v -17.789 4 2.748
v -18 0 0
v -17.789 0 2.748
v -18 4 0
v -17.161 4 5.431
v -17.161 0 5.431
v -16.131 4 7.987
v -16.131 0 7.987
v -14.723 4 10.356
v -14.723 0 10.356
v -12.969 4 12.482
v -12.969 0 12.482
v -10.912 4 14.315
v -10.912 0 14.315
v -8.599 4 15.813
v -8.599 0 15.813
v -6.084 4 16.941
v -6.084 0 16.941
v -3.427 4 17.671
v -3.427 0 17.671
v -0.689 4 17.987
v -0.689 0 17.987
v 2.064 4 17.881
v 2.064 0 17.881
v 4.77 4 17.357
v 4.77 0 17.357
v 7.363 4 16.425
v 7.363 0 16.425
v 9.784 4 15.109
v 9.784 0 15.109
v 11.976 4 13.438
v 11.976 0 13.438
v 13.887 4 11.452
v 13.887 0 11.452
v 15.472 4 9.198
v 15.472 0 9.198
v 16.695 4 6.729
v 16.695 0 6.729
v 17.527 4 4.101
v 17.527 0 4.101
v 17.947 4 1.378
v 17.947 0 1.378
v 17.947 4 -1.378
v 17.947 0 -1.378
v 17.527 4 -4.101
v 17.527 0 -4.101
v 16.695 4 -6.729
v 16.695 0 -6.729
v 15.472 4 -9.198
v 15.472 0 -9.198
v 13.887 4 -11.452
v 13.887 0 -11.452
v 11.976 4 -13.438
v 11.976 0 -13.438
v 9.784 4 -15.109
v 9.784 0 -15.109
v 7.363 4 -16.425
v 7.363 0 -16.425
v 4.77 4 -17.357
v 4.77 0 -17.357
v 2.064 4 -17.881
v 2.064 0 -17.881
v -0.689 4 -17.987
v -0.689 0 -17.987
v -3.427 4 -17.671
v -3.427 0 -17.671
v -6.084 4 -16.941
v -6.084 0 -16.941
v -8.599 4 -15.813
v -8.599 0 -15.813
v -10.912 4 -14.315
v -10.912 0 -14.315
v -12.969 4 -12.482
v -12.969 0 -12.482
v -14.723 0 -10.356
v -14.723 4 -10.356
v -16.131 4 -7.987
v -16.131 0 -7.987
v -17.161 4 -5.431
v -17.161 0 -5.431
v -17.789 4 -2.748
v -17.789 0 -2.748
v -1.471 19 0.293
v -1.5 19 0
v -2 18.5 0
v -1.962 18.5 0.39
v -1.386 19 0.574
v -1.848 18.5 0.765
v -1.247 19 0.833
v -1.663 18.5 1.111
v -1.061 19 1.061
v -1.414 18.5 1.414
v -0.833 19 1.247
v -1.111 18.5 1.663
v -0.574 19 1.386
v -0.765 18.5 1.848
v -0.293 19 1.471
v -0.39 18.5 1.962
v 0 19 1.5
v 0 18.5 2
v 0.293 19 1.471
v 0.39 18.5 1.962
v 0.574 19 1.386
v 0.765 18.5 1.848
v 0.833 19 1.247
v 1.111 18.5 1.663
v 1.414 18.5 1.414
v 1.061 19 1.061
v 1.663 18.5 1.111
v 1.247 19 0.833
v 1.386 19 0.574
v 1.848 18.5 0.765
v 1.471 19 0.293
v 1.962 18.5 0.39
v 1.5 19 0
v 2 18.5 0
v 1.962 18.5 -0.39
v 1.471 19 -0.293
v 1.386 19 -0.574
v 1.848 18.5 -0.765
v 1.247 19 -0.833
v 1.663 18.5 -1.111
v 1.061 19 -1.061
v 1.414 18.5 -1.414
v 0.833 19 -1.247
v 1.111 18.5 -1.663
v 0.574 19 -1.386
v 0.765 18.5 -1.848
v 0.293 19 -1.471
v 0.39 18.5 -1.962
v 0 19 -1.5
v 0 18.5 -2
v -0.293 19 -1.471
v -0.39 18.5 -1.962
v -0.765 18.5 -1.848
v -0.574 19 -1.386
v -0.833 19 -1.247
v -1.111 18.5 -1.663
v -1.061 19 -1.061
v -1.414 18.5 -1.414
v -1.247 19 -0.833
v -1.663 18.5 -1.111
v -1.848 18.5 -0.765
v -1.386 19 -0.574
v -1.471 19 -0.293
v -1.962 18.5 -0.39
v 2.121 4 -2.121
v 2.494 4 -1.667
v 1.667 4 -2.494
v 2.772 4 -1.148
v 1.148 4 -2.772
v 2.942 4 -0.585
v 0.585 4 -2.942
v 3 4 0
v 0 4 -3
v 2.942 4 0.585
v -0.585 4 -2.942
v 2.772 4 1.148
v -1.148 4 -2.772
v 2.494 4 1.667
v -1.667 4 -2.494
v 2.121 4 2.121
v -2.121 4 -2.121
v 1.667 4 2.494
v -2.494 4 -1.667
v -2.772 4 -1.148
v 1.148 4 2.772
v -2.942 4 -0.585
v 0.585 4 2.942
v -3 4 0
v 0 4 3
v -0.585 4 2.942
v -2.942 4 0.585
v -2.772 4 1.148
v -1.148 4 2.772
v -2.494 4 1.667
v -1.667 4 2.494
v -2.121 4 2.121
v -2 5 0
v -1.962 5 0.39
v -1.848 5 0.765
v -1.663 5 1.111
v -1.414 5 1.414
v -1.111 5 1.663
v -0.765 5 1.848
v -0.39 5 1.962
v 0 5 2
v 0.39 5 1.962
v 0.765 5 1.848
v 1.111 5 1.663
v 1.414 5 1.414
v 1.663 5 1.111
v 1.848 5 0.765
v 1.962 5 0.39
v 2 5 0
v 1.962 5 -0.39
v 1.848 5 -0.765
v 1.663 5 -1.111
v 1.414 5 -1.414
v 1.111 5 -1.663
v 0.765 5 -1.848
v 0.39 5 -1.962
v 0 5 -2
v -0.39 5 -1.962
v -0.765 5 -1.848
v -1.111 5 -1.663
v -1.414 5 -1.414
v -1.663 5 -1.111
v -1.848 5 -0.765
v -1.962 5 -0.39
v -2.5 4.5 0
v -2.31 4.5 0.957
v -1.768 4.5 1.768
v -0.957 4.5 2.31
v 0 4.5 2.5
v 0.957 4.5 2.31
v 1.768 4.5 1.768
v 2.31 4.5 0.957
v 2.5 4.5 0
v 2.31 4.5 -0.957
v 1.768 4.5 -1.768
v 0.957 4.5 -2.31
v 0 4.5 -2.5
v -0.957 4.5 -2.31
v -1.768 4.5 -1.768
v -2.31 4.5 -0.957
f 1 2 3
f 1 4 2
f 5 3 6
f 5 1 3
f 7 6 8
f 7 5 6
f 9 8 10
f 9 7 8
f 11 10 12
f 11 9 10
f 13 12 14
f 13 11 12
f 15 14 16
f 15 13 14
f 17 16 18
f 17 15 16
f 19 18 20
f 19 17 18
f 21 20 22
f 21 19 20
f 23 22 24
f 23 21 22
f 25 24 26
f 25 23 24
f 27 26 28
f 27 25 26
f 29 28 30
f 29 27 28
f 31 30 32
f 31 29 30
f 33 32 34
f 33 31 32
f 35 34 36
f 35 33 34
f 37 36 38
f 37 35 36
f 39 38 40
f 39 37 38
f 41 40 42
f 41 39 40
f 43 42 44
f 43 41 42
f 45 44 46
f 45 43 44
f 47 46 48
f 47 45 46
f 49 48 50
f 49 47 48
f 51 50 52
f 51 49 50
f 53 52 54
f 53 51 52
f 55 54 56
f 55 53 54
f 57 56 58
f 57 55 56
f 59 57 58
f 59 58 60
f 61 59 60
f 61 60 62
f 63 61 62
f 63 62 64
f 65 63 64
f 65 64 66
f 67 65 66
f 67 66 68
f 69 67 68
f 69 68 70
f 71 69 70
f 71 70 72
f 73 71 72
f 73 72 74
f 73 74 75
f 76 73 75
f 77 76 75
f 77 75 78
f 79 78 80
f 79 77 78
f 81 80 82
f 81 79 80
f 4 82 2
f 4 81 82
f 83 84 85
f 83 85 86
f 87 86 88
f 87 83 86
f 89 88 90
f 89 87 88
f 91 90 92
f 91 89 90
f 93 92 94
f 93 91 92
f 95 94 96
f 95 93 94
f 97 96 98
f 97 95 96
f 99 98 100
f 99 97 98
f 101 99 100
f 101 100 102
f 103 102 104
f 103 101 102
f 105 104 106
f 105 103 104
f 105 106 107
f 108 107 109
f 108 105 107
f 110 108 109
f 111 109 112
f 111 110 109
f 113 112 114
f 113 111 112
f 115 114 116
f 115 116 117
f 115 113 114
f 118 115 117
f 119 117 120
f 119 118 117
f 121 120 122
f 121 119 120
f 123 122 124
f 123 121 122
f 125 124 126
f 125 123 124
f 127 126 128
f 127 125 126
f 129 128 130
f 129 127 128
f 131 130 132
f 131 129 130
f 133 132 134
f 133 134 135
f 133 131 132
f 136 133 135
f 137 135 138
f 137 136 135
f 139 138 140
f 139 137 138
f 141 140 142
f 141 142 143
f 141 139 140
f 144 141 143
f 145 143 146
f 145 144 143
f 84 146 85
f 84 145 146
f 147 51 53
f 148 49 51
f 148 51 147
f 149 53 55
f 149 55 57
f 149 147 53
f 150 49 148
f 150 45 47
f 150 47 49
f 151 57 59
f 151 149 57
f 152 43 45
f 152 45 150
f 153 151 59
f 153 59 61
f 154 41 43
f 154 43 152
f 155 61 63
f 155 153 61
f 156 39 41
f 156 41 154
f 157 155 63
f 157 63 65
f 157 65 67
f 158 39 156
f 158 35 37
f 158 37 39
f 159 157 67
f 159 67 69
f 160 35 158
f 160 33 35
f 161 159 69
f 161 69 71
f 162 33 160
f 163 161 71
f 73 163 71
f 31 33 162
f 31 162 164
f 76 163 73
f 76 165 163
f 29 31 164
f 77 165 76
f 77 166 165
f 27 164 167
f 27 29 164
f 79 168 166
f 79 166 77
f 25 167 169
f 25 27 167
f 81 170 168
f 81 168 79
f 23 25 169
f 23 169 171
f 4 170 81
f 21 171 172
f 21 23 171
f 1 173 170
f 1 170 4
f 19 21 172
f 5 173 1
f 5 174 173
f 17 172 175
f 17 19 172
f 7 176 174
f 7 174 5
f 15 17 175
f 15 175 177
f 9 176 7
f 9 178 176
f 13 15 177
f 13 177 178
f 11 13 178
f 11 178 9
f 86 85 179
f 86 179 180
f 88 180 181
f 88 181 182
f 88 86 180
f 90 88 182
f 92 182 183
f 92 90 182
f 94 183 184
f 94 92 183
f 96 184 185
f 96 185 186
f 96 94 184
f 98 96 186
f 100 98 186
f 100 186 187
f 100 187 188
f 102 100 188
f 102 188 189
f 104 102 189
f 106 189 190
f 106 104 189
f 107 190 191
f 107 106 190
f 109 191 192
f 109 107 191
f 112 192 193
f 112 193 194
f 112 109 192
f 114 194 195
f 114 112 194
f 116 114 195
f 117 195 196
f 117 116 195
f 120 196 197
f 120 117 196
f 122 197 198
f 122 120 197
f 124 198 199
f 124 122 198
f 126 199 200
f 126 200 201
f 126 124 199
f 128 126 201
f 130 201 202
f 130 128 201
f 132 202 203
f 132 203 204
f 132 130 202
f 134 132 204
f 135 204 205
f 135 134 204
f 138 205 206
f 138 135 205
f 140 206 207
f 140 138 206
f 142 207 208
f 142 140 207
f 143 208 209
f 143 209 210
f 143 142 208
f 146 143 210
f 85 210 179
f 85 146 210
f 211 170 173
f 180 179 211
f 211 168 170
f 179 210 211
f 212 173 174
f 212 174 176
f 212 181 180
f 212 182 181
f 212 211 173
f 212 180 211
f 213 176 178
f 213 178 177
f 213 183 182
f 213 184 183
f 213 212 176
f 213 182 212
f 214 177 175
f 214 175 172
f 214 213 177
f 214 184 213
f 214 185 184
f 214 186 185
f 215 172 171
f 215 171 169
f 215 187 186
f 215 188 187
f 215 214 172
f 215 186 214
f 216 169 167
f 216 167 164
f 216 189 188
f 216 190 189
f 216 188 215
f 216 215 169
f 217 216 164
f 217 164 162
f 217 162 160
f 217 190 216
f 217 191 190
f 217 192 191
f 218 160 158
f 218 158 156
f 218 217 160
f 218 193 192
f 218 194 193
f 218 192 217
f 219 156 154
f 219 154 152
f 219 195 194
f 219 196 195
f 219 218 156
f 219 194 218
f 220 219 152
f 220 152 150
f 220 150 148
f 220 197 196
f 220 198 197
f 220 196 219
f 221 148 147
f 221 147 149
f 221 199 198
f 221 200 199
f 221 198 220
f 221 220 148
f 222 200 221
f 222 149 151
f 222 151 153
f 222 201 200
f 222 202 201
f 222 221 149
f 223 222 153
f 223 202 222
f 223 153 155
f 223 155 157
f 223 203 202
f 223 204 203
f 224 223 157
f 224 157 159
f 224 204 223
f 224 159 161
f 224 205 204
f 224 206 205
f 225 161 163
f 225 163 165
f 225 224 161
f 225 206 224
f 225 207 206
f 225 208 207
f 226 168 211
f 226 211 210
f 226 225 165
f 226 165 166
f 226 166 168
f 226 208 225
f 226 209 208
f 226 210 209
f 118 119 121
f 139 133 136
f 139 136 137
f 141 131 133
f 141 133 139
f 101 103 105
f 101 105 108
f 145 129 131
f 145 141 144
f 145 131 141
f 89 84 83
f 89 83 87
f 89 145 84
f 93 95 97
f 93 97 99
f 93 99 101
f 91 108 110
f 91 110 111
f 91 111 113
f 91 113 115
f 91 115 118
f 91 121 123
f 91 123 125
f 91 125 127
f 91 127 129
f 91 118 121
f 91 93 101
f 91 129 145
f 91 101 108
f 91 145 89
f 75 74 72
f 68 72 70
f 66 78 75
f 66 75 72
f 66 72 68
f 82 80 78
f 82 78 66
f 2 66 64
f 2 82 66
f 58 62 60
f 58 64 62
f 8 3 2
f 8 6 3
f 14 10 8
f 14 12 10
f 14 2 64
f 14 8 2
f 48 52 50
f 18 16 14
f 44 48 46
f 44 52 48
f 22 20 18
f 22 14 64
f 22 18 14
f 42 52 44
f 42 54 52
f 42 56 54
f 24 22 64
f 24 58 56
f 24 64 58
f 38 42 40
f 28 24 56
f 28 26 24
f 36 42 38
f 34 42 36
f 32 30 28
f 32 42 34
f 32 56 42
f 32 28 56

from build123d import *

# Parameters (mm, degrees)
CHANFREIN1_SIZE = 1
CHANFREIN2_SIZE = 0.5


with BuildPart() as part:
    # Esquisse1 → Révolution1 (revolve)
    with BuildSketch(Plane.XY):
        Polygon((0, 0), (-18, 0), (-18, 4), (-2, 4), (-2, 19), (0, 19), align=None)
    revolve(axis=Axis((0, 0, 0), (0, 1, 0)))

    # Chanfrein1
    chanfrein1_edges = [part.edges().sort_by_distance(p)[0] for p in [
        (2, 4, 0),
    ]]
    chamfer(chanfrein1_edges, length=CHANFREIN1_SIZE)

    # Chanfrein2
    chanfrein2_edges = [part.edges().sort_by_distance(p)[0] for p in [
        (2, 19, 0),
    ]]
    chamfer(chanfrein2_edges, length=CHANFREIN2_SIZE)


solid = part.part
